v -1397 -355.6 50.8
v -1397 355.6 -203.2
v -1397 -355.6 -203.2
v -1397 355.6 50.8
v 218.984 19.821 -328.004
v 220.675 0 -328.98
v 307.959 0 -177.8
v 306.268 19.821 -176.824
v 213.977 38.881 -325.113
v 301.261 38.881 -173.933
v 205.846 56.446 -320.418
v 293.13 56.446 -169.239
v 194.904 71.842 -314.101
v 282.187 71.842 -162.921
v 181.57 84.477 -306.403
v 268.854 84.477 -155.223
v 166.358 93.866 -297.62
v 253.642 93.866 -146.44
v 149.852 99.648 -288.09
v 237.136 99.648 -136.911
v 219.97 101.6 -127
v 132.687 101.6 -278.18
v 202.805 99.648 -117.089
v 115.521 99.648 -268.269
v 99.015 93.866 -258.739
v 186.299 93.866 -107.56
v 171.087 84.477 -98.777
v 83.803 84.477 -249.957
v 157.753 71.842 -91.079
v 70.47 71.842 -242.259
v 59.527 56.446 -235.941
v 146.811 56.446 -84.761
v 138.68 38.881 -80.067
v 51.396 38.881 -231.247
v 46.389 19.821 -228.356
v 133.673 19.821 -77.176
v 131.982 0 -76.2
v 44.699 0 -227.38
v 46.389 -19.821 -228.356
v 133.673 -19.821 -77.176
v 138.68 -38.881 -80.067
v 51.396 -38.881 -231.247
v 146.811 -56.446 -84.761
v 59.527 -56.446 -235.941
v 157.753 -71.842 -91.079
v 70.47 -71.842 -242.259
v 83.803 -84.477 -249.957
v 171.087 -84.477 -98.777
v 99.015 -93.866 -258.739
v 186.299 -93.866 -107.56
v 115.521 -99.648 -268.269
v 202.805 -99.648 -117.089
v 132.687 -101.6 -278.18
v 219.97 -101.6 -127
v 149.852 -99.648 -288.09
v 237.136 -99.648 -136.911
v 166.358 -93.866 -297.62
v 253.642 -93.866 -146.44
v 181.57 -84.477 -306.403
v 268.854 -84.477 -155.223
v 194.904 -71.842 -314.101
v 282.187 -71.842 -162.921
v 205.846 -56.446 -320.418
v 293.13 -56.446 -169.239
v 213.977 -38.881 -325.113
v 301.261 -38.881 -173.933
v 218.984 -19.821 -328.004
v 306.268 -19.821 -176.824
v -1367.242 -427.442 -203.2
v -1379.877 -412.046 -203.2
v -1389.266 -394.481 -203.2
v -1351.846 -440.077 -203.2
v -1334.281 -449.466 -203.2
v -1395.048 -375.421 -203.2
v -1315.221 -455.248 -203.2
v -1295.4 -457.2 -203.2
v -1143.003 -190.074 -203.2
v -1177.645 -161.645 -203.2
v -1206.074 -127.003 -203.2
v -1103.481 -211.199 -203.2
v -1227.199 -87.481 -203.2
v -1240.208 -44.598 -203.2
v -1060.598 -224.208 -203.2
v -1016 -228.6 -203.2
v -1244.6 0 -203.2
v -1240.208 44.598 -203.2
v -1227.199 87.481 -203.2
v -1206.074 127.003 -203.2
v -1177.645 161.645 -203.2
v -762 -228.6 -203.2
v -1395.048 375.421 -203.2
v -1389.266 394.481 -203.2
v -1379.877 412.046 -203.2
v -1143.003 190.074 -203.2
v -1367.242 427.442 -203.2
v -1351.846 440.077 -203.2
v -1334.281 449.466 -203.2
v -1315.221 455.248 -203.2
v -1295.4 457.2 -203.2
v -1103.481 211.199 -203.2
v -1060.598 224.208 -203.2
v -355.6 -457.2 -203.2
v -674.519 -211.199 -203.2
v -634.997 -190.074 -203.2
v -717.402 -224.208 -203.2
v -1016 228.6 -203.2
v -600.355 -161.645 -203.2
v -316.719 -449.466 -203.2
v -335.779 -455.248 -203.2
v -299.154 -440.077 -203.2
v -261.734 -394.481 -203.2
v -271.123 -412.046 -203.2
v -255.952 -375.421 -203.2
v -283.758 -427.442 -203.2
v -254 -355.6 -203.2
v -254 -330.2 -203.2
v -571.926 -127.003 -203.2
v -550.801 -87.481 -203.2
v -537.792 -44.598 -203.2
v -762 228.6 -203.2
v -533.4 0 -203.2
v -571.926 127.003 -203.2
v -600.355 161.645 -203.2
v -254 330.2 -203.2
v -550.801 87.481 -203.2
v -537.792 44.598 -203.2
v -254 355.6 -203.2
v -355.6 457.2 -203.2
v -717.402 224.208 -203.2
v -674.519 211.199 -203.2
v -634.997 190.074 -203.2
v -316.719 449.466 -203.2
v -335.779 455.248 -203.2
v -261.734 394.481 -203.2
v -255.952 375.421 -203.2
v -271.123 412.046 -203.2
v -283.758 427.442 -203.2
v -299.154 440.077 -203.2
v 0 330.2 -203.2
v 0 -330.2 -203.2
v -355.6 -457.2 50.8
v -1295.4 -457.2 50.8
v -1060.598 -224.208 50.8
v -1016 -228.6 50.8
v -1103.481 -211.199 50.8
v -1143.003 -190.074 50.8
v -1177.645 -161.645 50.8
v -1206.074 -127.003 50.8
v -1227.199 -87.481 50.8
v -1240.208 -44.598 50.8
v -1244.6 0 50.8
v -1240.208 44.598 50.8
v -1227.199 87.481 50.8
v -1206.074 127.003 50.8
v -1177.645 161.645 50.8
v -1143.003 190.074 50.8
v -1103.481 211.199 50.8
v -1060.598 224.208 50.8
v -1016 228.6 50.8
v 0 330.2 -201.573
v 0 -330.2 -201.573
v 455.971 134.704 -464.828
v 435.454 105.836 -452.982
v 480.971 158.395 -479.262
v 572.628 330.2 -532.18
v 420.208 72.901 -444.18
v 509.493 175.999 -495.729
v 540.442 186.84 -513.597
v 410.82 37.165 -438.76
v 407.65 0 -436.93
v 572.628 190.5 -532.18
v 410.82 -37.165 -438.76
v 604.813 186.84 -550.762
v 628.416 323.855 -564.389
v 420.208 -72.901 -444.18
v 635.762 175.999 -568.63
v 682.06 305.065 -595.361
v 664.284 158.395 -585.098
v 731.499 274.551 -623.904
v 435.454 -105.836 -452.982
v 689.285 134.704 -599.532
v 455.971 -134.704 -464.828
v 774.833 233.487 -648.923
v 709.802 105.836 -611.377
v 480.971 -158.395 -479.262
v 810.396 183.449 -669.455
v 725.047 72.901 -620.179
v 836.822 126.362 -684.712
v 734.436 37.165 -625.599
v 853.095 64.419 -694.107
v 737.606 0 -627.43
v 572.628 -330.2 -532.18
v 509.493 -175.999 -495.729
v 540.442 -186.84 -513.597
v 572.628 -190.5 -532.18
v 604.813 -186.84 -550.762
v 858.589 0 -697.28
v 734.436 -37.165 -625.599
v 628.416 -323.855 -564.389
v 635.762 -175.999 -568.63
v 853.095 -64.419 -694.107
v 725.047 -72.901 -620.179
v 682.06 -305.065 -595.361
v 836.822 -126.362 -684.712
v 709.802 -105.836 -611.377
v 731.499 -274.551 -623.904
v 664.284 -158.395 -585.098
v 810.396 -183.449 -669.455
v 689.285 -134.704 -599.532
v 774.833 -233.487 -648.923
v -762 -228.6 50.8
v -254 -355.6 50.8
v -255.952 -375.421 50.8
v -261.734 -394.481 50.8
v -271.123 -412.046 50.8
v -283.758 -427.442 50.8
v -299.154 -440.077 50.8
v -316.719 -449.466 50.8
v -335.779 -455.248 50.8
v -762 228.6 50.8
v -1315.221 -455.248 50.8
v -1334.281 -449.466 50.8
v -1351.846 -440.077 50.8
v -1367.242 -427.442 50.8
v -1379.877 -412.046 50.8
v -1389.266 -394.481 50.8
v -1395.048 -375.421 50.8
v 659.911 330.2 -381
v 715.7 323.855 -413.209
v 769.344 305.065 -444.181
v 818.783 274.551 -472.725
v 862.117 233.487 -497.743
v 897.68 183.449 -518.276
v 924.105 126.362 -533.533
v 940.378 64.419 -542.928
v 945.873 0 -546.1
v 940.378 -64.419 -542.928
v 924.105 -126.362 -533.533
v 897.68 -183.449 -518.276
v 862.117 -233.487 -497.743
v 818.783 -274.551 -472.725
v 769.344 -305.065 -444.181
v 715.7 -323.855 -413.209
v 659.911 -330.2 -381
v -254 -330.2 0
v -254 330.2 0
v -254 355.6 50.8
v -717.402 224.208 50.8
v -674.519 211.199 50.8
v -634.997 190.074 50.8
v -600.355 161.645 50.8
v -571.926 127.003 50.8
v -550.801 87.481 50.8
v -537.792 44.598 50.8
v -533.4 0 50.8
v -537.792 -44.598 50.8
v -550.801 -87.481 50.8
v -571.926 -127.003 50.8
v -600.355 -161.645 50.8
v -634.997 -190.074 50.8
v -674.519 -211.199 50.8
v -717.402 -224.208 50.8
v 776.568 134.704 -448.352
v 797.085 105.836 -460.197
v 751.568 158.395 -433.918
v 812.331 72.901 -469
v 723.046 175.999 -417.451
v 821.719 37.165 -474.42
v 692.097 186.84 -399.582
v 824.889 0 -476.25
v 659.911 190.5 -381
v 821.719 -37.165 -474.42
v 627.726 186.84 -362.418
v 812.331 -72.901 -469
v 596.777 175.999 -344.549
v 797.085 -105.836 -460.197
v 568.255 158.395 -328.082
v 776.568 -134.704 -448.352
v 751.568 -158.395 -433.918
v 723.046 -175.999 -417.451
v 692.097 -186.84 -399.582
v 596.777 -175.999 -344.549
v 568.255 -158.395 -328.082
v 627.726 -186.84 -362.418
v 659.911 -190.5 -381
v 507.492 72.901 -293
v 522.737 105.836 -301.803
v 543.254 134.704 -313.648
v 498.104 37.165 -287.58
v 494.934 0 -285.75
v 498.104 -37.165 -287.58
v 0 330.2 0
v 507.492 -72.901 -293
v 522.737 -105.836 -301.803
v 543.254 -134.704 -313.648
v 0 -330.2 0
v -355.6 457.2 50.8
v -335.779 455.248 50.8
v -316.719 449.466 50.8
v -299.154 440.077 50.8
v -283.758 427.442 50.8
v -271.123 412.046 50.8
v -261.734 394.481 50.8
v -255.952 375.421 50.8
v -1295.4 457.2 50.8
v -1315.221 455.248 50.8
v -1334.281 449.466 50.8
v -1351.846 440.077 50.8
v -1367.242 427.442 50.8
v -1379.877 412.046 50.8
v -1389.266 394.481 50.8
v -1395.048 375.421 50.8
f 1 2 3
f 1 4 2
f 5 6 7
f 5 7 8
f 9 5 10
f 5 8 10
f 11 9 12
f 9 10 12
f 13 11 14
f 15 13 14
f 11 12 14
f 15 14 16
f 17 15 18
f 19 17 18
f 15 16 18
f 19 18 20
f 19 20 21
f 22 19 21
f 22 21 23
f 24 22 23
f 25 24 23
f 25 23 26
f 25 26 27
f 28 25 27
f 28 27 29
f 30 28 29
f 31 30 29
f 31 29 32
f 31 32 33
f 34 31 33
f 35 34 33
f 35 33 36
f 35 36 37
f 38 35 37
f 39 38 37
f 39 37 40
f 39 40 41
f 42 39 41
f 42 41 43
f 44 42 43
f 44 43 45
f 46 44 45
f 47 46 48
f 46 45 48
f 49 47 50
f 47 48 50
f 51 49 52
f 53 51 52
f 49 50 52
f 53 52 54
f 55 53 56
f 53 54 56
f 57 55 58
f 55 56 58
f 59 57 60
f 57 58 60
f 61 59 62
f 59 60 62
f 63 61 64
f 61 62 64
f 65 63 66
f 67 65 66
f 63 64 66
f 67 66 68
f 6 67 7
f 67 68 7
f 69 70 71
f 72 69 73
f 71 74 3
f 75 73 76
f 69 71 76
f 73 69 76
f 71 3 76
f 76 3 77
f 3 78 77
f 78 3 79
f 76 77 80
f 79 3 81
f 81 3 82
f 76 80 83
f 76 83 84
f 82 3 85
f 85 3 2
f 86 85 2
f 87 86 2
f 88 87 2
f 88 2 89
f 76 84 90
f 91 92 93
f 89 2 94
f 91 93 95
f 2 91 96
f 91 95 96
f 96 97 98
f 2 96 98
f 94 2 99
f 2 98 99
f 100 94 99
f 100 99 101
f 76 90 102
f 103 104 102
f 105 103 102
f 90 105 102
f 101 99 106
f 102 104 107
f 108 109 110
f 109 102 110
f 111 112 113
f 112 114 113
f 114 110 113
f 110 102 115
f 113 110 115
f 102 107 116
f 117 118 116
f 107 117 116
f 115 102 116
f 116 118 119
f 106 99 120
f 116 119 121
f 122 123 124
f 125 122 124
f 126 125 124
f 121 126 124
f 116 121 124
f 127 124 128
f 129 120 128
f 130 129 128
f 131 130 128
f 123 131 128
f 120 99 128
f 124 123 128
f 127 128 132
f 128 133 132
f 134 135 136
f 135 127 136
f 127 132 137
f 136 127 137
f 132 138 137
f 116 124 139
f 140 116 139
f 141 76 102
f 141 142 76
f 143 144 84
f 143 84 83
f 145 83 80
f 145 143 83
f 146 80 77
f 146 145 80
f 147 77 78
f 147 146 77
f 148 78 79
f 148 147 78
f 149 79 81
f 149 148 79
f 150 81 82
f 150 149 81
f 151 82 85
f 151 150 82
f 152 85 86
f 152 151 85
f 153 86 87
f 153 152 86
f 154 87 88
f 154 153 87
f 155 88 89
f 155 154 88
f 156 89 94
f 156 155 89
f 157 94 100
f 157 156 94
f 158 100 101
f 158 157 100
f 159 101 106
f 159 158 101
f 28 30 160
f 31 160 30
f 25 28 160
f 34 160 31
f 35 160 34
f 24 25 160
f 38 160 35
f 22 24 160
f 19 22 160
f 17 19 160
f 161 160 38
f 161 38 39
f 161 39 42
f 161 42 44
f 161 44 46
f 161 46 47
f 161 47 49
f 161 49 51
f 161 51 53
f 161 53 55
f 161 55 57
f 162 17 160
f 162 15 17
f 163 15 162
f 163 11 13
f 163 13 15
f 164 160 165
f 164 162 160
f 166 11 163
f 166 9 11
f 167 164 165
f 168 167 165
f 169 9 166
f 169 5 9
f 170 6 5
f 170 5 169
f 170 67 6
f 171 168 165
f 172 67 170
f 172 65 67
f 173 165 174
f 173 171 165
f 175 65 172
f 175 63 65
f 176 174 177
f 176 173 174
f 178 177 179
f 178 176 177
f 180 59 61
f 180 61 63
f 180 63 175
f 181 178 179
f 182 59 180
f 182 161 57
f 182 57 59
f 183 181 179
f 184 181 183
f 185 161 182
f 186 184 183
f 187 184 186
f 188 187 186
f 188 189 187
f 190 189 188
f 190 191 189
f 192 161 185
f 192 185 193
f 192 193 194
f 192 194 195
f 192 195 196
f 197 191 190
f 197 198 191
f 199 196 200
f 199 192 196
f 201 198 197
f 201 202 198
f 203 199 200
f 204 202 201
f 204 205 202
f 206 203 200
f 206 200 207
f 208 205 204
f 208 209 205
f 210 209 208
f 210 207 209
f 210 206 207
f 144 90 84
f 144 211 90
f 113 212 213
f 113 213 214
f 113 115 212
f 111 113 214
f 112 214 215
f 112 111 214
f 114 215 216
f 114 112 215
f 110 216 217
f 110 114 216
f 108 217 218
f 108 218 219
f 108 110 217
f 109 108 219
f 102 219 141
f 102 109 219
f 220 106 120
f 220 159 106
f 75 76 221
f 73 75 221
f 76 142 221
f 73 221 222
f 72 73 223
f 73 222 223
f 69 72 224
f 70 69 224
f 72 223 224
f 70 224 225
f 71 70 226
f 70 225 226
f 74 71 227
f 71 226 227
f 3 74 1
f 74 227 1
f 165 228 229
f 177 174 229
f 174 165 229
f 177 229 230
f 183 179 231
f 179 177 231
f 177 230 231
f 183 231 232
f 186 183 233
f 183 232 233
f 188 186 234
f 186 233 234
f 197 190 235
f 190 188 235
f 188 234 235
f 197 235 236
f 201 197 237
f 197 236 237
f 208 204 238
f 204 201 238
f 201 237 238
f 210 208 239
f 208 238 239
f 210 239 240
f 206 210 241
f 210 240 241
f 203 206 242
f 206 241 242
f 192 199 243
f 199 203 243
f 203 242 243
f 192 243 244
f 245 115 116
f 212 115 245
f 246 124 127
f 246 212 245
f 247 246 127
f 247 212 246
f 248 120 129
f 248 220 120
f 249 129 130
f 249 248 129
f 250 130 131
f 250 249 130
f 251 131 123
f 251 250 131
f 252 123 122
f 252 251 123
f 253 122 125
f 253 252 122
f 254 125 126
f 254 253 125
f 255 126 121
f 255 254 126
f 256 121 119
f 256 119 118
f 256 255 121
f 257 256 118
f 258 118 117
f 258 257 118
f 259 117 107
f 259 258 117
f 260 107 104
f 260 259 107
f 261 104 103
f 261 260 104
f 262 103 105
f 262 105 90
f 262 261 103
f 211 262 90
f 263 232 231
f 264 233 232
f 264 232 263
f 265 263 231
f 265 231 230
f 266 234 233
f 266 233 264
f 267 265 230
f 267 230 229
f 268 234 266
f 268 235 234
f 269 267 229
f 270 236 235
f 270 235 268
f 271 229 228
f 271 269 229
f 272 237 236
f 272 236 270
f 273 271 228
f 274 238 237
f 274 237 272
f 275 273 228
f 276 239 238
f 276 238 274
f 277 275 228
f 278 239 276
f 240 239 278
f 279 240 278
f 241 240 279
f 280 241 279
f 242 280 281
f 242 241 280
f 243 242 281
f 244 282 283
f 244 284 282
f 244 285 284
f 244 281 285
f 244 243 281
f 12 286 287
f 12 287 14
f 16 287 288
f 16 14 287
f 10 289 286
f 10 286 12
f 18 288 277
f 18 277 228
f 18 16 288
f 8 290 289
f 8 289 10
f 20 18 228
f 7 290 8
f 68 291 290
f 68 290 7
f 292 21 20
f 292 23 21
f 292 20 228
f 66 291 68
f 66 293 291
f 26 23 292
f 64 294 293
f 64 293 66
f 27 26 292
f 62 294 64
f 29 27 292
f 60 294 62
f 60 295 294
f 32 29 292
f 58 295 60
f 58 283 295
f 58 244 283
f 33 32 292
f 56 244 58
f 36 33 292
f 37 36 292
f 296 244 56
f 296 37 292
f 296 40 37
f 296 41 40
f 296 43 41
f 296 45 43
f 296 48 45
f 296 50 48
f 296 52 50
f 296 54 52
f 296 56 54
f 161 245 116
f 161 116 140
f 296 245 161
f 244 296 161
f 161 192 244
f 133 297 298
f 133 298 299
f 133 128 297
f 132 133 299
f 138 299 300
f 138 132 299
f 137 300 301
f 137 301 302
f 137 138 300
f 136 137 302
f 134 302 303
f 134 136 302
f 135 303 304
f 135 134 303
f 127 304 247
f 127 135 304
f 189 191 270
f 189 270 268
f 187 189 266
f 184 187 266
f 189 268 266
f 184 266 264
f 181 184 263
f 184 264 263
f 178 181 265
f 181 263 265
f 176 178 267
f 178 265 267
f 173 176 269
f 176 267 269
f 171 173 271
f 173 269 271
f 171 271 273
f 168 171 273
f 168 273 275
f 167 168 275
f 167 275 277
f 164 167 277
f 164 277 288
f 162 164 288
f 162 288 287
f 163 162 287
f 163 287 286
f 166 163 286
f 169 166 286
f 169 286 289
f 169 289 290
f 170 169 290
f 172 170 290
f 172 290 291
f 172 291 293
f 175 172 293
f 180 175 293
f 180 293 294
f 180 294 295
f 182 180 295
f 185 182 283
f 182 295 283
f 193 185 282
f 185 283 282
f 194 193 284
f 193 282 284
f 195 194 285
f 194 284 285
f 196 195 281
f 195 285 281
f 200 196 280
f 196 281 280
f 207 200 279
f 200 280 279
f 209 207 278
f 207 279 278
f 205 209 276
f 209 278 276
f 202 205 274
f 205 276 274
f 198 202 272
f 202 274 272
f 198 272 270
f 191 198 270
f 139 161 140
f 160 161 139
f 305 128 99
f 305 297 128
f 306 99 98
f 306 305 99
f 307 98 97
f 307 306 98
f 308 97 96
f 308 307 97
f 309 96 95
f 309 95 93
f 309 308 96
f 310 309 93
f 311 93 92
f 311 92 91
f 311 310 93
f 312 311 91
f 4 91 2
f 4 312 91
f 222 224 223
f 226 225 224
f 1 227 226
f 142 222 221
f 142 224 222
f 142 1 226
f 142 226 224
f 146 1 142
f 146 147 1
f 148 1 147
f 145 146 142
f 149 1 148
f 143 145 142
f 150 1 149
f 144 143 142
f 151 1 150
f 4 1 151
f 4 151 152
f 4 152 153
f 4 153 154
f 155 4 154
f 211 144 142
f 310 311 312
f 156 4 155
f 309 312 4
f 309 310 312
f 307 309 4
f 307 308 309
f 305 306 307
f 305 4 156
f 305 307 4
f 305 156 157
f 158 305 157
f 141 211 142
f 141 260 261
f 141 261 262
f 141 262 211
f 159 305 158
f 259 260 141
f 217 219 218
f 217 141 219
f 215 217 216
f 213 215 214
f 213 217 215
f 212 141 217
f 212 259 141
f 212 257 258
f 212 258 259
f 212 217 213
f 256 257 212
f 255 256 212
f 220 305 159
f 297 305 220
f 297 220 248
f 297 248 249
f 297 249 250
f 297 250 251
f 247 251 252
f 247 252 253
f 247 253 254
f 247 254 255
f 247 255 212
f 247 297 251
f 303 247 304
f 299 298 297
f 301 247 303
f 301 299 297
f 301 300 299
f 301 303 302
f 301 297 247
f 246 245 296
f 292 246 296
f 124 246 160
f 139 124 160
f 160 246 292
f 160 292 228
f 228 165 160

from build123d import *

# Parameters (mm, degrees)
F0_W          = 254
F0_H          = 660.4
F1_DEPTH      = 203.2
F3_DEPTH      = 50.8
F3_DEPTH_BACK = 203.2
F4_R          = 101.6
F6_DEPTH      = 660.4
F8_DEPTH      = 1302.3629254774
F9_R          = 190.5
F9_R_2        = 101.6
F10_DEPTH     = 1302.3629254774


with BuildPart() as f1:
    # F0 (on Top) → F1 (new body)
    with BuildSketch(Plane.XY):
        with Locations((-127, 0)):
            Rectangle(F0_W, F0_H)
    extrude(amount=-F1_DEPTH)

    # F2 (on face) → F3 (join, two sides)
    with BuildSketch(Plane.XY) as f3_sk:
        Polygon((-254, 330.2), (-254, 457.2), (-1397, 457.2), (-1397, -457.2), (-254, -457.2), (-254, -330.2), align=None)
        with BuildLine():
            ThreePointArc((-1016, -228.6), (-1244.6, 0), (-1016, 228.6))
            Line((-1016, 228.6), (-762, 228.6))
            ThreePointArc((-762, 228.6), (-533.4, 0), (-762, -228.6))
            Line((-762, -228.6), (-1016, -228.6))
        make_face(mode=Mode.SUBTRACT)
    extrude(amount=F3_DEPTH)
    extrude(f3_sk.sketch, amount=-F3_DEPTH_BACK)

    # F4
    f4_edges = [f1.edges().sort_by_distance(p)[0] for p in [
        (-254, -457.2, -76.2),
        (-254, 457.2, -76.2),
        (-1397, 457.2, -76.2),
        (-1397, -457.2, -76.2),
    ]]
    fillet(f4_edges, radius=F4_R)

    # F5 (on face) → F6 (join)
    with BuildSketch(Plane.XZ.offset(330.2)):
        Polygon((945.8729460134, -546.1), (0, 0), (-87.2836349805, -151.1796904555), (858.5893110329, -697.2796904555), align=None)
    extrude(amount=-F6_DEPTH)

    # F7 (on face) → F8 (cut, through all)
    with BuildSketch(Plane(origin=(0, 0, 0), x_dir=(0.8660254038, 0, -0.5), z_dir=(0.5, 0, 0.8660254038))):
        with BuildLine():
            ThreePointArc((1092.2, -1.051e-06), (995.4866587762, -233.4866595194), (762, -330.2))
            Line((762, -330.2), (1092.2, -330.2))
            Line((1092.2, -330.2), (1092.2, -1.051e-06))
        make_face()
        with BuildLine():
            ThreePointArc((762, 330.2), (995.4866595194, 233.4866587762), (1092.2, -1.051e-06))
            Line((1092.2, -1.051e-06), (1092.2, 330.2))
            Line((1092.2, 330.2), (762, 330.2))
        make_face()
    extrude(amount=-F8_DEPTH, mode=Mode.SUBTRACT)

    # F9 (on face) → F10 (cut, through all)
    with BuildSketch(Plane(origin=(0, 0, 0), x_dir=(0.8660254038, 0, -0.5), z_dir=(0.5, 0, 0.8660254038))):
        with Locations((762, 0)):
            Circle(F9_R)
        with Locations((254, 0)):
            Circle(F9_R_2)
    extrude(amount=-F10_DEPTH, mode=Mode.SUBTRACT)


solid = f1.part
